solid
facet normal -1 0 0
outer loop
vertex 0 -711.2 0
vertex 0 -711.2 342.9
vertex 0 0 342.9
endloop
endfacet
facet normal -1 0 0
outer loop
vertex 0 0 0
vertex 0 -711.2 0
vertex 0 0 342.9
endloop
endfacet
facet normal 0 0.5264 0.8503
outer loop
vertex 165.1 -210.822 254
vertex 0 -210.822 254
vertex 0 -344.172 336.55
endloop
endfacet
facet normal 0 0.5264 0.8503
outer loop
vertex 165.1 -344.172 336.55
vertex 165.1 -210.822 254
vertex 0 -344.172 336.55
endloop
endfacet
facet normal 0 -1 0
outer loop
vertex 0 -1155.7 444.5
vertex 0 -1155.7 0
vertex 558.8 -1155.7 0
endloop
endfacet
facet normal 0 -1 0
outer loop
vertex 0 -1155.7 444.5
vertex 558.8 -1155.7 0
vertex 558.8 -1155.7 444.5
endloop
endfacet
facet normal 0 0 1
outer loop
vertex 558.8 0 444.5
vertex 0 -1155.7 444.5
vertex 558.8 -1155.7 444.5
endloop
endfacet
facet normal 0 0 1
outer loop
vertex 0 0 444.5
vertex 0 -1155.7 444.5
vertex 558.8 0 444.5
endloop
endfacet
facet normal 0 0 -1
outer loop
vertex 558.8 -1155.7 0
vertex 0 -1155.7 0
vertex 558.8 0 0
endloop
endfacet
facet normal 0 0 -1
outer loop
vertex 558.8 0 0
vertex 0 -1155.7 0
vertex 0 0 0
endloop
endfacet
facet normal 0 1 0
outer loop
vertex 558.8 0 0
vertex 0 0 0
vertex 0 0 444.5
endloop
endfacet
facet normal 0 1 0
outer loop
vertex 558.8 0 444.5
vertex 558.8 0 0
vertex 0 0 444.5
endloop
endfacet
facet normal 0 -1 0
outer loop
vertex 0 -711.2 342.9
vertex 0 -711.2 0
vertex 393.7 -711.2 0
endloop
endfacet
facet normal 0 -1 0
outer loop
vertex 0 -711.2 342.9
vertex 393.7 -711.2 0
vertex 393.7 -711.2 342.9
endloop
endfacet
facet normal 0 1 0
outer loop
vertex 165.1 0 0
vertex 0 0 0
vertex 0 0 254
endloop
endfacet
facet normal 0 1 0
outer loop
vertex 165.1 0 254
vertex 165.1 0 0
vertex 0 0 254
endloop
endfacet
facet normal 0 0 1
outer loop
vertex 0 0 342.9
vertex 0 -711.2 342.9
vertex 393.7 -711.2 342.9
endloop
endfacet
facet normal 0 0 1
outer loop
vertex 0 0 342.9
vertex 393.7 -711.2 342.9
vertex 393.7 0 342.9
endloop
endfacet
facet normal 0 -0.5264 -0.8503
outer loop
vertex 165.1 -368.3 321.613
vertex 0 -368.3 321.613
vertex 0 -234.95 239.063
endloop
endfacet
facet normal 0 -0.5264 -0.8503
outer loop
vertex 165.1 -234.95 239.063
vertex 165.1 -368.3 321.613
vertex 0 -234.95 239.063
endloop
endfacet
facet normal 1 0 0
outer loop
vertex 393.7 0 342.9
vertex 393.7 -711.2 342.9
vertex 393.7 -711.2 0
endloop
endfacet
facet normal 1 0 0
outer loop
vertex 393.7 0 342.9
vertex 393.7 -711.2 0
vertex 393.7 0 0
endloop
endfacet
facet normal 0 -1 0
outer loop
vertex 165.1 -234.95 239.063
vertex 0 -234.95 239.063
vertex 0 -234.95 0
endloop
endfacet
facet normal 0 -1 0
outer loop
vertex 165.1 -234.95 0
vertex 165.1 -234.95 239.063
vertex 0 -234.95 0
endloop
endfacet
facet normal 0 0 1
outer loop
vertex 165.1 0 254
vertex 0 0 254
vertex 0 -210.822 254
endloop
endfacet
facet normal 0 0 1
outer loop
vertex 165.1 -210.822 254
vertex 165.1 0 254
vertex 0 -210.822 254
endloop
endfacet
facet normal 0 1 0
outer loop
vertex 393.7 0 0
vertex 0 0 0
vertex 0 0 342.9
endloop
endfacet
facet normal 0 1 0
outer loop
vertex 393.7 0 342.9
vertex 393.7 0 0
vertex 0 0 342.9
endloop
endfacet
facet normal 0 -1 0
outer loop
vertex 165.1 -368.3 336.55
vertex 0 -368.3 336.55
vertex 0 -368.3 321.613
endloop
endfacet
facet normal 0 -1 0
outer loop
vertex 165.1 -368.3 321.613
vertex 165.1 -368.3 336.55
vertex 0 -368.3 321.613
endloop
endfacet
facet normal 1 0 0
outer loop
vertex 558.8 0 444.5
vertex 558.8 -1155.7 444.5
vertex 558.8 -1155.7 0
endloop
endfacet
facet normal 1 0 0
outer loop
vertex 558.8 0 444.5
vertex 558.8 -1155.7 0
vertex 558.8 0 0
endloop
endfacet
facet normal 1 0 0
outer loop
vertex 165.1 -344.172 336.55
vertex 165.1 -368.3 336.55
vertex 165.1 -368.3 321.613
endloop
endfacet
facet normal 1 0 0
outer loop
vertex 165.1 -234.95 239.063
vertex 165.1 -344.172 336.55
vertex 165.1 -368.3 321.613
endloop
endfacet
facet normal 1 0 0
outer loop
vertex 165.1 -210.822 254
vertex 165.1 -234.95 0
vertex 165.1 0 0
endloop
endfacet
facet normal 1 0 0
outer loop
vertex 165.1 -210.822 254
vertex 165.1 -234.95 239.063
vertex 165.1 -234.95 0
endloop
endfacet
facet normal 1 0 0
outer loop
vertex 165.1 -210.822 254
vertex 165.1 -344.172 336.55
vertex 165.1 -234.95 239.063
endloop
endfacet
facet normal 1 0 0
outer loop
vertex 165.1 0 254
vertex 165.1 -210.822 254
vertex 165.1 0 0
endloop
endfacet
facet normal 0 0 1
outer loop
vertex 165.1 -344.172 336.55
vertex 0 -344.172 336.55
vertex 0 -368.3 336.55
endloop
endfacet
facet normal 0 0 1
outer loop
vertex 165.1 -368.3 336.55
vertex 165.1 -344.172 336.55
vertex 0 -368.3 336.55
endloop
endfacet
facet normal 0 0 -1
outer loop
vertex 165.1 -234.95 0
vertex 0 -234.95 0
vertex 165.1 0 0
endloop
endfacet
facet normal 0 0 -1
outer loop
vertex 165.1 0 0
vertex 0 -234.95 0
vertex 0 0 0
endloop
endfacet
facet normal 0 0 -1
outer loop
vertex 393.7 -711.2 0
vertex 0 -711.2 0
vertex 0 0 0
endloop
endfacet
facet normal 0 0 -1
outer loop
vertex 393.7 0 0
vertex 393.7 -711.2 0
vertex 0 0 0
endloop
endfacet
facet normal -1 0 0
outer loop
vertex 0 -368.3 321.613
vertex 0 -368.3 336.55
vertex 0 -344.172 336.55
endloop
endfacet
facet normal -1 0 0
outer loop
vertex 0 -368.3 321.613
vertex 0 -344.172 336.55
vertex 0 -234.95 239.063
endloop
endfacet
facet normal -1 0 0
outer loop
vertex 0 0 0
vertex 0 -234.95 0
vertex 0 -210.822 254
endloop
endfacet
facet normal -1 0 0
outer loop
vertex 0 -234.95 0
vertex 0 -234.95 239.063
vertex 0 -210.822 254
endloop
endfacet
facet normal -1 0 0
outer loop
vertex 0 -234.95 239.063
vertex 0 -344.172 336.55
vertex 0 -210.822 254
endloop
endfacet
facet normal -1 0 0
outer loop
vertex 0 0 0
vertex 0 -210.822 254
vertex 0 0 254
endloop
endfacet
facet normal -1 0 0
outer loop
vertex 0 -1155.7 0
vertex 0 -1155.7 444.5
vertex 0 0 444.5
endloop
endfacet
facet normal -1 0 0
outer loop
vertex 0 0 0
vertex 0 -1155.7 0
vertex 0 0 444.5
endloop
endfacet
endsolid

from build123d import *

# Parameters (mm, degrees)
F0_W     = 1155.7
F0_H     = 444.5
F1_DEPTH = 558.8
F2_W     = 711.2
F2_H     = 342.9
F3_DEPTH = 393.7
F5_DEPTH = 165.1


with BuildPart() as f1:
    # F0 (on Right) → F1 (new body)
    with BuildSketch(Plane.YZ):
        with Locations((-577.85, 222.25)):
            Rectangle(F0_W, F0_H)
    extrude(amount=F1_DEPTH)


with BuildPart() as f3:
    # F2 (on Right) → F3 (new body)
    with BuildSketch(Plane.YZ):
        with Locations((-355.6, 171.45)):
            Rectangle(F2_W, F2_H)
    extrude(amount=F3_DEPTH)


with BuildPart() as f5:
    # F4 (on Right) → F5 (new body)
    with BuildSketch(Plane.YZ):
        Polygon((-234.95, 0), (0, 0), (0, 254), (-210.82178, 254), (-344.17178, 336.55), (-368.3, 336.55), (-368.3, 321.613483), (-234.95, 239.063483), align=None)
    extrude(amount=F5_DEPTH)


solid = Compound([f1.part, f3.part, f5.part])
